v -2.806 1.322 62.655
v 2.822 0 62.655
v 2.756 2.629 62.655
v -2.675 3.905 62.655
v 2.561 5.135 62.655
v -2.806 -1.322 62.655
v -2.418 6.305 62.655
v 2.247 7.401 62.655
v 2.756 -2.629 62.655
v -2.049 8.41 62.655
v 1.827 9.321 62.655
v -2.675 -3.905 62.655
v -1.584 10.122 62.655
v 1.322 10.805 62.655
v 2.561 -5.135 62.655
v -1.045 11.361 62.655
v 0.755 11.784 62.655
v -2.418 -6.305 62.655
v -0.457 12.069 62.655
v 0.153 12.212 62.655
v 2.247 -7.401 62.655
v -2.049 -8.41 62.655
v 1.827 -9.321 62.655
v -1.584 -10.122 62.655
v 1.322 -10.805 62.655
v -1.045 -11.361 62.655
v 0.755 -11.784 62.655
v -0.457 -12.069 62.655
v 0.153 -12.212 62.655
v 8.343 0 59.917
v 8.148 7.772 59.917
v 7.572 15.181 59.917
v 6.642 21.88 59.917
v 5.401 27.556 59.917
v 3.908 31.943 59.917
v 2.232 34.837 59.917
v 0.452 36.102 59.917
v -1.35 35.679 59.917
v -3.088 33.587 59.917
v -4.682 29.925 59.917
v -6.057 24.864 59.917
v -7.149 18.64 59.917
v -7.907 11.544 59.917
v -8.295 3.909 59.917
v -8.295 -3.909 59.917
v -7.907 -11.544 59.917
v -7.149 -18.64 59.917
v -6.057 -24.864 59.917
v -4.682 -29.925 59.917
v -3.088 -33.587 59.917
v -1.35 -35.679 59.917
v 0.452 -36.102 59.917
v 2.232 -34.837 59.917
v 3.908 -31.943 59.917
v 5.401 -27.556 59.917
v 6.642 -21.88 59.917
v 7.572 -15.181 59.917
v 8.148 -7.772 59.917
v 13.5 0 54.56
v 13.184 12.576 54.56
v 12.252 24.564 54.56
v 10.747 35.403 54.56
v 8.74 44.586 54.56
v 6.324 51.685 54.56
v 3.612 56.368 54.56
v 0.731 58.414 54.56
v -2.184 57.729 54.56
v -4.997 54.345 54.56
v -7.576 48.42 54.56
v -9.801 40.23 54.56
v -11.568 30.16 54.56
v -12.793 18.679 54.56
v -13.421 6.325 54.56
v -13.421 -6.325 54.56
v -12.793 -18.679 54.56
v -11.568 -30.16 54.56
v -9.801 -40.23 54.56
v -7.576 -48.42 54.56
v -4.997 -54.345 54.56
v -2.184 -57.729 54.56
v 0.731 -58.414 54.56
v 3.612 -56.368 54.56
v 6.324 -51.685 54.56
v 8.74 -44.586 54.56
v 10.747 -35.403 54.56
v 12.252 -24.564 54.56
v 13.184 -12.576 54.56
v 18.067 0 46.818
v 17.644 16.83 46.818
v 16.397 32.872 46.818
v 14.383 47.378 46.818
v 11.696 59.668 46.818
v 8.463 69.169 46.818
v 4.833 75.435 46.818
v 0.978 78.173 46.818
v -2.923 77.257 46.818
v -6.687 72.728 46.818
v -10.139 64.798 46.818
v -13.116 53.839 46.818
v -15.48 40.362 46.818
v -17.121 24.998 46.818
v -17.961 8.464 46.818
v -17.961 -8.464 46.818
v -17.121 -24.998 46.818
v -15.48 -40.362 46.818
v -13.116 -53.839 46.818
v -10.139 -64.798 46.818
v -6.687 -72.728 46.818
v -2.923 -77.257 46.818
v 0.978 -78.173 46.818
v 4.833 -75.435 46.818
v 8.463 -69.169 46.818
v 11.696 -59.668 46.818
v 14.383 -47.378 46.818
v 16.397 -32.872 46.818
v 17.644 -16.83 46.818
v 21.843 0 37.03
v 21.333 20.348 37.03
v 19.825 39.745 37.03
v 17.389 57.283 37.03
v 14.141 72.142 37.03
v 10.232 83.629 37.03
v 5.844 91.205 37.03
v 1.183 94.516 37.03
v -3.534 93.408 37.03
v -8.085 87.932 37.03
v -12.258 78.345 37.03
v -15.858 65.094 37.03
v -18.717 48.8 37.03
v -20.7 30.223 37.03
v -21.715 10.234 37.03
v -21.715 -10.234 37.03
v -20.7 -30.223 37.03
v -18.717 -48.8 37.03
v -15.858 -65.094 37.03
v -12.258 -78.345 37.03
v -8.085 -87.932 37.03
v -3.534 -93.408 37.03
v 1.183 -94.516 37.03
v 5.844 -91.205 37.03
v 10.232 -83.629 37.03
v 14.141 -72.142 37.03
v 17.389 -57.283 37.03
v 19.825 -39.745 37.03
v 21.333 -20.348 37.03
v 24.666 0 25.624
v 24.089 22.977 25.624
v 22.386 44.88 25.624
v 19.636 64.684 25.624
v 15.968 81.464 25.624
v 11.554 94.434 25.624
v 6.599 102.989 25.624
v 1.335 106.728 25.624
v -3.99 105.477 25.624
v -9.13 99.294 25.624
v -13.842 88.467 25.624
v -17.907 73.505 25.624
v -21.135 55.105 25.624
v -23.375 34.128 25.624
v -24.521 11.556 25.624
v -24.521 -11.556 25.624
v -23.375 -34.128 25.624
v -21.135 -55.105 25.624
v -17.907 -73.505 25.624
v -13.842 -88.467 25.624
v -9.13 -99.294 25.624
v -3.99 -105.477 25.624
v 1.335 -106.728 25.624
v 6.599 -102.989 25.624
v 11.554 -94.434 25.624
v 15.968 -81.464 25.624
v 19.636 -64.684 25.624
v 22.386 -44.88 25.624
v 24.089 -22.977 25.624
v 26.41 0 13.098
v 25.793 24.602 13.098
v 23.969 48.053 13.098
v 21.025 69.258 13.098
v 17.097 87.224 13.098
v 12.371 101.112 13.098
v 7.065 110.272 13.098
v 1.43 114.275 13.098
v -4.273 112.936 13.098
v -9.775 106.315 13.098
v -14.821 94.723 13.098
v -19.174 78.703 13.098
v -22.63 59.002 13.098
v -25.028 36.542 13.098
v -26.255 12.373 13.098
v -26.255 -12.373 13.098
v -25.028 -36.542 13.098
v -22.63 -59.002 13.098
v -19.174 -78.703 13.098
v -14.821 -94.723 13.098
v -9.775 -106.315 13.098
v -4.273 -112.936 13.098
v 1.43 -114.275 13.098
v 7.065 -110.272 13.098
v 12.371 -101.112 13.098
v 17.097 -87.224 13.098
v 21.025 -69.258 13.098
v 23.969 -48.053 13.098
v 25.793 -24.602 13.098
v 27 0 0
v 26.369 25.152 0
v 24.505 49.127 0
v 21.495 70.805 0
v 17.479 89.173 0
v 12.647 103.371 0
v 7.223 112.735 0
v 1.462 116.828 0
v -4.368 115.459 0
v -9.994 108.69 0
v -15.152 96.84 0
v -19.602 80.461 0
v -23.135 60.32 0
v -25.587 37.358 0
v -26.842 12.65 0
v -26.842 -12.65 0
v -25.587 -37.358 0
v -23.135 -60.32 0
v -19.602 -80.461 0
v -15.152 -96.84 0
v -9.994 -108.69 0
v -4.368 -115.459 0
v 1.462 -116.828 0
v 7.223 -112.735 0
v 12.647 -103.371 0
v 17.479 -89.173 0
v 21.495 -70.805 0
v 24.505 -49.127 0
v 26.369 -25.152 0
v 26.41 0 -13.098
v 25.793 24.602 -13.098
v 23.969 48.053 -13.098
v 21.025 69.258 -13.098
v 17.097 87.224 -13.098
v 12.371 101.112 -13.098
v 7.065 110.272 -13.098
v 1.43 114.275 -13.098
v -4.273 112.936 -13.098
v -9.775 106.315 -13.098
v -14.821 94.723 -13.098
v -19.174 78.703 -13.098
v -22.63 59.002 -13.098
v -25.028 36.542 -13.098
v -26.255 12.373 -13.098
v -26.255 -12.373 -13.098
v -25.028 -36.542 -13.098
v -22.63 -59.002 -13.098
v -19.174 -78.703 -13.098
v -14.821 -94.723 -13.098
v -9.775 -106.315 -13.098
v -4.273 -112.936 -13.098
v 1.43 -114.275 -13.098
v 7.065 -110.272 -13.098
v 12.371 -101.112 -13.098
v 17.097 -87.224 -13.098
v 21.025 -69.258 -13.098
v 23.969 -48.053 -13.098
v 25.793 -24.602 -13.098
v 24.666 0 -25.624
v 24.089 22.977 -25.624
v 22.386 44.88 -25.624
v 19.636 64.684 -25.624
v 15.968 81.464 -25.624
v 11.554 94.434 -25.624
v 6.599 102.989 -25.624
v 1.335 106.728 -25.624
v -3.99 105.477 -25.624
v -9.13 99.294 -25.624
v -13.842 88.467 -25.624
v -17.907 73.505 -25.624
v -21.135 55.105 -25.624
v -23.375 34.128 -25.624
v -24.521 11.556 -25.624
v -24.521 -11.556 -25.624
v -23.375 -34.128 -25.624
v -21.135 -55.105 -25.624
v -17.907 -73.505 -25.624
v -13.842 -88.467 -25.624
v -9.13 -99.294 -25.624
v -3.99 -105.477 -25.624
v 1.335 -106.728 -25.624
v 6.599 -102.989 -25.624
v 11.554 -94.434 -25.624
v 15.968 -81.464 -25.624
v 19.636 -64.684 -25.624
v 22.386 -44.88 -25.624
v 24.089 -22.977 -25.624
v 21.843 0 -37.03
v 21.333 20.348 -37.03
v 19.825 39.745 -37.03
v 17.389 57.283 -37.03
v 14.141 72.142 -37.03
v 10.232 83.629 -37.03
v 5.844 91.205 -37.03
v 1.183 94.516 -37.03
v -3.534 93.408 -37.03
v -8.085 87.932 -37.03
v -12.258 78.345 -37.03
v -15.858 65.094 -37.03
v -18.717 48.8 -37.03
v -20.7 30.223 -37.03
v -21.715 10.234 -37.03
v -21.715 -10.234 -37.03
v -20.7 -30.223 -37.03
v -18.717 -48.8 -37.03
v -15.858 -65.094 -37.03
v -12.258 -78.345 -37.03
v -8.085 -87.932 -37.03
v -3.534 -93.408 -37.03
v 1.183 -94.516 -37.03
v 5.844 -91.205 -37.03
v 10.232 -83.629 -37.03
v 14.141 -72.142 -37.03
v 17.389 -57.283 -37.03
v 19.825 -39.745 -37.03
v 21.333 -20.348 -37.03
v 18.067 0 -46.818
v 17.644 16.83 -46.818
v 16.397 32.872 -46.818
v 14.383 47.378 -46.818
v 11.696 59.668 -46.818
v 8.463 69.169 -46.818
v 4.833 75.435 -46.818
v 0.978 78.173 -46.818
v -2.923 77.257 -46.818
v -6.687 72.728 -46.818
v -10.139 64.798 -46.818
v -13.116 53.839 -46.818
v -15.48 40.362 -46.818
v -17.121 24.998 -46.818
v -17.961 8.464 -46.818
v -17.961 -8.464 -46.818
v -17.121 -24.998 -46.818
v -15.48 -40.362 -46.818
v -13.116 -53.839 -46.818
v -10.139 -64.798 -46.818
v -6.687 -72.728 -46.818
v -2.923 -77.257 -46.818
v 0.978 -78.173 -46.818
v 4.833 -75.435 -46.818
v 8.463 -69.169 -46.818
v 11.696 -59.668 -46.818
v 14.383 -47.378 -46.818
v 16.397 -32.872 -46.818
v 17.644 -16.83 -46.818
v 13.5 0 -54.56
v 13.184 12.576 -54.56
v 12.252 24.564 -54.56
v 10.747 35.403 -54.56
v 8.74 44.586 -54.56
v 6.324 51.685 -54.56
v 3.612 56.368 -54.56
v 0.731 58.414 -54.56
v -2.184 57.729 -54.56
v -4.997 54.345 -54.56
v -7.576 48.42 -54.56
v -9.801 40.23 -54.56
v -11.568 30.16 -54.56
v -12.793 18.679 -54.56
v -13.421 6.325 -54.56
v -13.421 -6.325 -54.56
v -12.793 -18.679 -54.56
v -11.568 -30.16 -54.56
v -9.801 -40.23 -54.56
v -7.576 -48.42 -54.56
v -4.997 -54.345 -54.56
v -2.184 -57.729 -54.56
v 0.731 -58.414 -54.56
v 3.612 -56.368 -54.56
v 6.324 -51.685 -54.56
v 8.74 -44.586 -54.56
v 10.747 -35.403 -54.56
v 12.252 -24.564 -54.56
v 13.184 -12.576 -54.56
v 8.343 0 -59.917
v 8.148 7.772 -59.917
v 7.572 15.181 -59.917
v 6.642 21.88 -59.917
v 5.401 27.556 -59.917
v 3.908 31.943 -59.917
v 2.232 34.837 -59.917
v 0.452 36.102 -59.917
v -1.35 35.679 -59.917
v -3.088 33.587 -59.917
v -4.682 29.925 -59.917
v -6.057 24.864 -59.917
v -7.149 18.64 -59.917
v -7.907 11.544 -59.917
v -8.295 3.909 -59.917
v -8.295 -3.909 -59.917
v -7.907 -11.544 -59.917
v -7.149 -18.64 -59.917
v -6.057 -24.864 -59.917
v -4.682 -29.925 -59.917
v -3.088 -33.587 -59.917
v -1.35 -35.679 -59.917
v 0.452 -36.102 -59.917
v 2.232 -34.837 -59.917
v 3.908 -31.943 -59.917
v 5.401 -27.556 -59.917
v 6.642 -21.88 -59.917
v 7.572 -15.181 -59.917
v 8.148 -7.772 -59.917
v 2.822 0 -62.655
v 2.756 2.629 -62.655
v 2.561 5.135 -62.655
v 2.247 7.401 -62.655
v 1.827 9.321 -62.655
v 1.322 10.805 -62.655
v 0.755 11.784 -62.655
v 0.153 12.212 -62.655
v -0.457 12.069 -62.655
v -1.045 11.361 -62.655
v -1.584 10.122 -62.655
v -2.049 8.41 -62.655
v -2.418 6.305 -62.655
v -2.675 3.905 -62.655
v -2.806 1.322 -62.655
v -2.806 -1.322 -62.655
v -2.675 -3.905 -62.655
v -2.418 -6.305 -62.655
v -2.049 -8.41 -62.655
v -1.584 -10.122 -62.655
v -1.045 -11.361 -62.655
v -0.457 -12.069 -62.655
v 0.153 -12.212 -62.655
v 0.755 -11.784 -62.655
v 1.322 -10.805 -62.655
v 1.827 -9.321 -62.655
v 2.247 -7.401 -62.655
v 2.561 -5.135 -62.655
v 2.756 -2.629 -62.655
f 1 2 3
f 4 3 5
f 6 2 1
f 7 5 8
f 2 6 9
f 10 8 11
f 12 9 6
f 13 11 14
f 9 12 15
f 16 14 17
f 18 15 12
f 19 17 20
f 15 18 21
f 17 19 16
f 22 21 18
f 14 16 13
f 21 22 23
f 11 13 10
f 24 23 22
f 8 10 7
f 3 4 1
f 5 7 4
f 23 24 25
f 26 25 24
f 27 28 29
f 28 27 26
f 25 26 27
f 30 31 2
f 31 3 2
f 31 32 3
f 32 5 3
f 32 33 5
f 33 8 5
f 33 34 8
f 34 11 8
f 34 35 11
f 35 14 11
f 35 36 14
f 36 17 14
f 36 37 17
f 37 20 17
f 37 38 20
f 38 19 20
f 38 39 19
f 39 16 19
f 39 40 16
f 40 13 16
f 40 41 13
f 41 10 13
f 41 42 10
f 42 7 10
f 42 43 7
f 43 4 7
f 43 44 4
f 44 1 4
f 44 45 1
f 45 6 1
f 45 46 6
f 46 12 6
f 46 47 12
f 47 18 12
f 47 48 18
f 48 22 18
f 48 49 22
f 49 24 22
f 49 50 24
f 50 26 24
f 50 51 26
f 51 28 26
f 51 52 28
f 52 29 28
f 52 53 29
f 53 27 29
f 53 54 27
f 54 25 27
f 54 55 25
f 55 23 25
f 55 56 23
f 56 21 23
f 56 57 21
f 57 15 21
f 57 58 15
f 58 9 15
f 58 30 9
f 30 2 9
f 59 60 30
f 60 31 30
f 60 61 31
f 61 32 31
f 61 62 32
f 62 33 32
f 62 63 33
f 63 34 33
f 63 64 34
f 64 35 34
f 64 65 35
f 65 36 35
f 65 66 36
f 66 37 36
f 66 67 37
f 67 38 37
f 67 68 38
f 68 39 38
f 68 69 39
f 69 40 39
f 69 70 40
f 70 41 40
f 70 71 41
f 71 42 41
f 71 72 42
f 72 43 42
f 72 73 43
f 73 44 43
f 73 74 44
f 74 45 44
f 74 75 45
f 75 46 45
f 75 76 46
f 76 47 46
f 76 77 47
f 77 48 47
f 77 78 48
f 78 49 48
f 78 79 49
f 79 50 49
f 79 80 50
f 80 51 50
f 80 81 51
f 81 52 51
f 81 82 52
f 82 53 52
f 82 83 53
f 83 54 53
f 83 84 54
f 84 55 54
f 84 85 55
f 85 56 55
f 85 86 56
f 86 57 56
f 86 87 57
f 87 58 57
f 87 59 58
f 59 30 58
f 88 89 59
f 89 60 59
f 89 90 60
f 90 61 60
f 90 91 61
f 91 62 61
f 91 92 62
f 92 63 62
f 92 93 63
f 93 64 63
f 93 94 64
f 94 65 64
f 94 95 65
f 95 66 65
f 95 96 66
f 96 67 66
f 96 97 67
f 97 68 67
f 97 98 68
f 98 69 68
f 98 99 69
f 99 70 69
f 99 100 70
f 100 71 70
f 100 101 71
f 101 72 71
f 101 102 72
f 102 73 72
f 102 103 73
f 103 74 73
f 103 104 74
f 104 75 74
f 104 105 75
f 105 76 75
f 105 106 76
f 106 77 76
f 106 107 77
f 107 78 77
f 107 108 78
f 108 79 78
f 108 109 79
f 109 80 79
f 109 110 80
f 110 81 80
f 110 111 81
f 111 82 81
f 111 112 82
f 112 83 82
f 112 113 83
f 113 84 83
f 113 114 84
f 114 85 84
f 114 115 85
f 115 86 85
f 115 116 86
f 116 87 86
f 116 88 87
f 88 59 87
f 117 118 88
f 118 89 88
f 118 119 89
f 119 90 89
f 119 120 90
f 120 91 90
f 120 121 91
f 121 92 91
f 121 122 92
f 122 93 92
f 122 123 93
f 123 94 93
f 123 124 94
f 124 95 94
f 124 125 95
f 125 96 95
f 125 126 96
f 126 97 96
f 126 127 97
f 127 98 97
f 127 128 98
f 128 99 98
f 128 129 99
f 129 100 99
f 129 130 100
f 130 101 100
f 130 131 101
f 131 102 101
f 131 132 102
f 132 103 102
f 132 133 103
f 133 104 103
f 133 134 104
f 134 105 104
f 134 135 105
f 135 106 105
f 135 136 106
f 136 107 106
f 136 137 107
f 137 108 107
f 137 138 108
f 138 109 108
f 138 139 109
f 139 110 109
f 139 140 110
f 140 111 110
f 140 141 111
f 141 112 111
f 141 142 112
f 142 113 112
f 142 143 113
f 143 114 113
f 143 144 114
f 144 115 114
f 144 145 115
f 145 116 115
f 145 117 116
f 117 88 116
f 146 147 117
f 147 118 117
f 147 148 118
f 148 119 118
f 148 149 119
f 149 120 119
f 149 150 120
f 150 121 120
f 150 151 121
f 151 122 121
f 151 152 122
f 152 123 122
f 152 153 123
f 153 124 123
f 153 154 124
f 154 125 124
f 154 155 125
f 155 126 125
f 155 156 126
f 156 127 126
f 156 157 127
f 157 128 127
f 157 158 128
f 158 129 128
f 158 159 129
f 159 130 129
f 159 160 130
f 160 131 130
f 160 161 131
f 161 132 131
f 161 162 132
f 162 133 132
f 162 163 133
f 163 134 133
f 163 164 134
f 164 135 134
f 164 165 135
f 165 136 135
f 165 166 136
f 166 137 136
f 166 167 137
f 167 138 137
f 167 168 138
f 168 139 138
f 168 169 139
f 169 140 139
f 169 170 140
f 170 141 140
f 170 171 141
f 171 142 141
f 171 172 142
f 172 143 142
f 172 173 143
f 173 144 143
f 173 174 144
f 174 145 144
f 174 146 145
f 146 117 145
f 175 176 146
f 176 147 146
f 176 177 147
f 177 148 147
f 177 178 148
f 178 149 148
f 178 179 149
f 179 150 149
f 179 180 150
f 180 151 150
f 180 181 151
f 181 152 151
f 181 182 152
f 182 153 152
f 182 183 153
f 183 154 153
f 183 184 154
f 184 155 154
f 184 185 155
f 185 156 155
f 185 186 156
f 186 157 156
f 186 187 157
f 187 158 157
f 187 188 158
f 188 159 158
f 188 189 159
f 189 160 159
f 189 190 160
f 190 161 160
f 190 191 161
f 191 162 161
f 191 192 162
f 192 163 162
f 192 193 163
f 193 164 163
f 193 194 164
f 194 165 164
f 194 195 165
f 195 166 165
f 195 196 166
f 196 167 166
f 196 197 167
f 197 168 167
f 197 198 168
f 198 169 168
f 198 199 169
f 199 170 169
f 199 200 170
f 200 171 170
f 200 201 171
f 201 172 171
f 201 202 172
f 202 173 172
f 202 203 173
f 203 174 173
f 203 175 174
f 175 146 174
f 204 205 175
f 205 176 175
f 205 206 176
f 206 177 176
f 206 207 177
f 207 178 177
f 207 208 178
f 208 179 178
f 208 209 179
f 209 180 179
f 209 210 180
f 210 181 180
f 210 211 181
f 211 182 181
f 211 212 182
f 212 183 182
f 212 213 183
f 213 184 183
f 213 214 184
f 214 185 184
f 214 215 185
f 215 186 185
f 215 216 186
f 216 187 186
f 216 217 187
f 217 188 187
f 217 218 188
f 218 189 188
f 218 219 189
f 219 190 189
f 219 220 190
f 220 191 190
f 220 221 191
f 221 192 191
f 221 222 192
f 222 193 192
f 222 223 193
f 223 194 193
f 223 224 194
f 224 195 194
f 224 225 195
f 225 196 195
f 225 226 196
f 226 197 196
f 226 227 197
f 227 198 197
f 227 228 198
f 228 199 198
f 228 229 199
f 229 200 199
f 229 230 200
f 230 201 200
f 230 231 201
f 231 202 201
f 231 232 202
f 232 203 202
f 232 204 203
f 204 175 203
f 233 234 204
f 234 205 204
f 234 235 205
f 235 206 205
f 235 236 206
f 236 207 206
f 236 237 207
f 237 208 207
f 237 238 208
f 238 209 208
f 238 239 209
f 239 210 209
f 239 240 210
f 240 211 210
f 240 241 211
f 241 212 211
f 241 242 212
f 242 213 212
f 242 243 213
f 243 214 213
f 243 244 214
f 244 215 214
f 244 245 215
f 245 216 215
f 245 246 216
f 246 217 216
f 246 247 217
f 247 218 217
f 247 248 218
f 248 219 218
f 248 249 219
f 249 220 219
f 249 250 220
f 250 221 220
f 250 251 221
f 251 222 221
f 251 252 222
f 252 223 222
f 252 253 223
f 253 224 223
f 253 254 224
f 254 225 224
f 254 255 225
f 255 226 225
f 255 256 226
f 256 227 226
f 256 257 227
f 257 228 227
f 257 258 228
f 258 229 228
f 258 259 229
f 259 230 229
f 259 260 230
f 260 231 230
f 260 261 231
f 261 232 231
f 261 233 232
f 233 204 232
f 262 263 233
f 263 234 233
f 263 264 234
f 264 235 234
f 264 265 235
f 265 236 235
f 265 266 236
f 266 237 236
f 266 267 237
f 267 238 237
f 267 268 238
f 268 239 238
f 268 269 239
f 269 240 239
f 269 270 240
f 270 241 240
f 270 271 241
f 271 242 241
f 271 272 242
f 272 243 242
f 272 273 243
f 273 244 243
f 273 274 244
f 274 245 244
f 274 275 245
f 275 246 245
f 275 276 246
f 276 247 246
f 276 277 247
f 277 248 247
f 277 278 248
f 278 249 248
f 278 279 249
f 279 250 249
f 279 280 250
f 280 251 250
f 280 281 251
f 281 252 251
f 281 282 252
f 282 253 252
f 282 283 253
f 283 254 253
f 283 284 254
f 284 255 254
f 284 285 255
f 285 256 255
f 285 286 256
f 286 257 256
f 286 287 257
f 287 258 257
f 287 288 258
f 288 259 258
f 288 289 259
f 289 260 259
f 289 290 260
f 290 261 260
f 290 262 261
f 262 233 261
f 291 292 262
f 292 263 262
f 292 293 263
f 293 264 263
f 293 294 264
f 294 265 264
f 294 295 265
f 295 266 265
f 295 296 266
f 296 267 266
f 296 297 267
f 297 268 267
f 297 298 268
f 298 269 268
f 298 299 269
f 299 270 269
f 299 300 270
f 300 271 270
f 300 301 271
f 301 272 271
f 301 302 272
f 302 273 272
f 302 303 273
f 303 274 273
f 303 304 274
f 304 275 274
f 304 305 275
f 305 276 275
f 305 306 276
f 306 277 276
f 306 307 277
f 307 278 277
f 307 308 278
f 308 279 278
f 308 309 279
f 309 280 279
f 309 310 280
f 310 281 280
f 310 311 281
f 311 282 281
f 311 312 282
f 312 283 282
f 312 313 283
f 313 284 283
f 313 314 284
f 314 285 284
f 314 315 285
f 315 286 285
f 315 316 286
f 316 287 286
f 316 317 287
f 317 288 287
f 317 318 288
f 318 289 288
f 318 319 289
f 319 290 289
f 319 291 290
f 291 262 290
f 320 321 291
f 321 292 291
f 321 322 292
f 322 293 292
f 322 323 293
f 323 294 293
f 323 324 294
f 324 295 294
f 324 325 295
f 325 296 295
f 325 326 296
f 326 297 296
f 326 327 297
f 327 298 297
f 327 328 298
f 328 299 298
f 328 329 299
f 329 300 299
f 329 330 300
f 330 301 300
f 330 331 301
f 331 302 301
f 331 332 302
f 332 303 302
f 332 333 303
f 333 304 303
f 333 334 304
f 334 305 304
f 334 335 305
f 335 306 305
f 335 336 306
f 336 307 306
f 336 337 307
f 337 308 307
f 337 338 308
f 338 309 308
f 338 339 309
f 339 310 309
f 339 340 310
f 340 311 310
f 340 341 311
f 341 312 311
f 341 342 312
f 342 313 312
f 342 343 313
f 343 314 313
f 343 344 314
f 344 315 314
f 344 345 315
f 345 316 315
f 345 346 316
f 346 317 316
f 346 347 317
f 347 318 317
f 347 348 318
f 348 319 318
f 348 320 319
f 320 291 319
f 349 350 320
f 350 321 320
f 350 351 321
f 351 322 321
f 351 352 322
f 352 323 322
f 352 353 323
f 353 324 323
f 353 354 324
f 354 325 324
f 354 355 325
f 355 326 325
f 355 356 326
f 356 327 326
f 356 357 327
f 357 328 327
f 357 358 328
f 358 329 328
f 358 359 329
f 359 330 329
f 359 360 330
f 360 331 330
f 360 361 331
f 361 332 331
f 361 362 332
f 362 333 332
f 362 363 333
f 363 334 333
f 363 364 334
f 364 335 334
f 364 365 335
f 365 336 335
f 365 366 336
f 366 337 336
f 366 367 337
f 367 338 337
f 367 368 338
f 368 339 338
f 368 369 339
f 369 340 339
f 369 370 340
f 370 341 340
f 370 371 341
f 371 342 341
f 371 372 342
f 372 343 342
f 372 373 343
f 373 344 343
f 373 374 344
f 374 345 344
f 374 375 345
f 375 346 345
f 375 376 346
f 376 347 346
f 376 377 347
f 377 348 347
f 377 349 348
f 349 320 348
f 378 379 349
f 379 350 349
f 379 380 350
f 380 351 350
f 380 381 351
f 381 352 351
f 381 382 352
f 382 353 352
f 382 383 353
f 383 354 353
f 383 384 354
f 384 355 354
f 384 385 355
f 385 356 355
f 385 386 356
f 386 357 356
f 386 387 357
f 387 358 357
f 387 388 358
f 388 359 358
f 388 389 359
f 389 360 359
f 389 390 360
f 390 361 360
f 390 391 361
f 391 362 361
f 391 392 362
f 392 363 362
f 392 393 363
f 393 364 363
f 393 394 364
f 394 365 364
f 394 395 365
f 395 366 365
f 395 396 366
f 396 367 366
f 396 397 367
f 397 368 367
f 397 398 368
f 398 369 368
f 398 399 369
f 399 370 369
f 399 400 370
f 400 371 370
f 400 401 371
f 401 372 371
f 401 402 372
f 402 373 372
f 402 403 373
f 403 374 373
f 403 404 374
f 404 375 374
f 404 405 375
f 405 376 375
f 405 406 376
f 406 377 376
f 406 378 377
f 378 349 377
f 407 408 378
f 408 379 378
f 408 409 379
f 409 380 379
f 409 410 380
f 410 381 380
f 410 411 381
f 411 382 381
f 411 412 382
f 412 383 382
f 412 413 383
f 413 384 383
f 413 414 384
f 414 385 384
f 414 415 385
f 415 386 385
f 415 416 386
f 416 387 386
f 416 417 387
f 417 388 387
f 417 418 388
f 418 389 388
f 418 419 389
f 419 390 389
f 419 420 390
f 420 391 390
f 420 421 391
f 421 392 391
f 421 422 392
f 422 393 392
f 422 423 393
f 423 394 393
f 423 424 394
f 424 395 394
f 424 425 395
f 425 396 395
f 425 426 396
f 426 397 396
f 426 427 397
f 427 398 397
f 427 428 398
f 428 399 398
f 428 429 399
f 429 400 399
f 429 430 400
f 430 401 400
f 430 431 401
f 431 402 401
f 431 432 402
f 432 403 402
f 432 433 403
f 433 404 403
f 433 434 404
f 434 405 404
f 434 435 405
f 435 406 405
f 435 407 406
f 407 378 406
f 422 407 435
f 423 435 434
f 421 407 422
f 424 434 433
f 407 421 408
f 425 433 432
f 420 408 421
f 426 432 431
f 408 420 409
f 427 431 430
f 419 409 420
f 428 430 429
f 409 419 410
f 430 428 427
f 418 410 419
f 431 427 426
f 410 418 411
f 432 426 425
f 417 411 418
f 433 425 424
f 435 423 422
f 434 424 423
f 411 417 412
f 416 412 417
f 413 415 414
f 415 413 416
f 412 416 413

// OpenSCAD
// Generated by SolidPython 1.0.1 on 2020-07-29 00:46:45


scale(v = [3, 13, 7]) {
	sphere(r = 9);
}
/***********************************************
*********      SolidPython code:      **********
************************************************
 
# import packages: SolidPython
from solid import *
from solid.utils import *
from itertools import chain, combinations, permutations


class Resize:

    def __init__(self, scad_file):
        self.scad_file = scad_file
        #self.scad_file = import_scad(scad_file)
        # cone/cylinder param:
        self.r1 = 0
        self.r2 = 0
        self.h = 0
        # rectangular prism param:
        self.w = 0
        self.l = 0
        # ellipse param:
        self.r = 0

    # import OpenScad code (file name corresponds to shape)


    # classify shape + parameters
    def assign(self, param1, param2, param3):
        if self.scad_file == 'cone.scad':
            self.r1 = param1
            self.r2 = param2
            self.h = param3
        elif self.scad_file == 'cylinder.scad':
            self.r1 = param1
            self.r2 = param2
            self.h = param3
        elif self.scad_file == 'rectangularPrism.scad':
            self.h = param1
            self.l = param2
            self.w = param3
        else:
            self.r = param1
            self.h = param2

    # resize parameters
    def iterate(self):
        x = range(3, 20, 2)
        i = 1
        if self.scad_file == 'cone.scad':
            tempList = list(permutations(x, 2))
            for temp in tempList:
                param1 = temp[0]
                param2 = temp[1]
                filepath = 'produced_scad_files/' + 'cone' + str(param1) + '_' + str(param2) + '_' + '.scad'
                scad_render_to_file(cylinder(h=param1, r1=param2, r2=0), filepath)

        elif self.scad_file == 'cylinder.scad':
            tempList = list(permutations(x, 3))
            for temp in tempList:
                param1 = temp[0]
                param2 = temp[1]
                filepath = 'produced_scad_files/' + 'cylinder' + str(param1) + '_' + str(param2) + '_' + '.scad'
                scad_render_to_file(cylinder(h=param1, r1=param2, r2=param2), filepath)

        elif self.scad_file == 'rectangularPrism.scad':
            tempList = list(permutations(x, 3))
            for temp in tempList:
                param1 = temp[0]
                param2 = temp[1]
                param3 = temp[2]
                filepath = 'produced_scad_files/' + 'rectangularPrism' + str(param1) + '_' + str(param2) + '_' + str(
                    param3) + '.scad'
                scad_render_to_file(cube(size=(param1, param2, param3)), filepath)

        elif self.scad_file == 'ellipse.scad':
            tempList = list(permutations(x, 4))
            for temp in tempList:
                param1 = temp[0]
                param2 = temp[1]
                param3 = temp[2]
                param4 = temp[3]
                filepath = 'produced_scad_files/' + 'ellipse' + str(param1) + '_' + str(param2) + '_' + str(param3) + '_' + str(param4) + '.scad'
                scad_render_to_file(scale([param1, param2, param3])(sphere(r=param4)), filepath)

    def render_to_scadfile(self):
        scad_render_to_file(scad, 'example.scad') 
 
************************************************/
